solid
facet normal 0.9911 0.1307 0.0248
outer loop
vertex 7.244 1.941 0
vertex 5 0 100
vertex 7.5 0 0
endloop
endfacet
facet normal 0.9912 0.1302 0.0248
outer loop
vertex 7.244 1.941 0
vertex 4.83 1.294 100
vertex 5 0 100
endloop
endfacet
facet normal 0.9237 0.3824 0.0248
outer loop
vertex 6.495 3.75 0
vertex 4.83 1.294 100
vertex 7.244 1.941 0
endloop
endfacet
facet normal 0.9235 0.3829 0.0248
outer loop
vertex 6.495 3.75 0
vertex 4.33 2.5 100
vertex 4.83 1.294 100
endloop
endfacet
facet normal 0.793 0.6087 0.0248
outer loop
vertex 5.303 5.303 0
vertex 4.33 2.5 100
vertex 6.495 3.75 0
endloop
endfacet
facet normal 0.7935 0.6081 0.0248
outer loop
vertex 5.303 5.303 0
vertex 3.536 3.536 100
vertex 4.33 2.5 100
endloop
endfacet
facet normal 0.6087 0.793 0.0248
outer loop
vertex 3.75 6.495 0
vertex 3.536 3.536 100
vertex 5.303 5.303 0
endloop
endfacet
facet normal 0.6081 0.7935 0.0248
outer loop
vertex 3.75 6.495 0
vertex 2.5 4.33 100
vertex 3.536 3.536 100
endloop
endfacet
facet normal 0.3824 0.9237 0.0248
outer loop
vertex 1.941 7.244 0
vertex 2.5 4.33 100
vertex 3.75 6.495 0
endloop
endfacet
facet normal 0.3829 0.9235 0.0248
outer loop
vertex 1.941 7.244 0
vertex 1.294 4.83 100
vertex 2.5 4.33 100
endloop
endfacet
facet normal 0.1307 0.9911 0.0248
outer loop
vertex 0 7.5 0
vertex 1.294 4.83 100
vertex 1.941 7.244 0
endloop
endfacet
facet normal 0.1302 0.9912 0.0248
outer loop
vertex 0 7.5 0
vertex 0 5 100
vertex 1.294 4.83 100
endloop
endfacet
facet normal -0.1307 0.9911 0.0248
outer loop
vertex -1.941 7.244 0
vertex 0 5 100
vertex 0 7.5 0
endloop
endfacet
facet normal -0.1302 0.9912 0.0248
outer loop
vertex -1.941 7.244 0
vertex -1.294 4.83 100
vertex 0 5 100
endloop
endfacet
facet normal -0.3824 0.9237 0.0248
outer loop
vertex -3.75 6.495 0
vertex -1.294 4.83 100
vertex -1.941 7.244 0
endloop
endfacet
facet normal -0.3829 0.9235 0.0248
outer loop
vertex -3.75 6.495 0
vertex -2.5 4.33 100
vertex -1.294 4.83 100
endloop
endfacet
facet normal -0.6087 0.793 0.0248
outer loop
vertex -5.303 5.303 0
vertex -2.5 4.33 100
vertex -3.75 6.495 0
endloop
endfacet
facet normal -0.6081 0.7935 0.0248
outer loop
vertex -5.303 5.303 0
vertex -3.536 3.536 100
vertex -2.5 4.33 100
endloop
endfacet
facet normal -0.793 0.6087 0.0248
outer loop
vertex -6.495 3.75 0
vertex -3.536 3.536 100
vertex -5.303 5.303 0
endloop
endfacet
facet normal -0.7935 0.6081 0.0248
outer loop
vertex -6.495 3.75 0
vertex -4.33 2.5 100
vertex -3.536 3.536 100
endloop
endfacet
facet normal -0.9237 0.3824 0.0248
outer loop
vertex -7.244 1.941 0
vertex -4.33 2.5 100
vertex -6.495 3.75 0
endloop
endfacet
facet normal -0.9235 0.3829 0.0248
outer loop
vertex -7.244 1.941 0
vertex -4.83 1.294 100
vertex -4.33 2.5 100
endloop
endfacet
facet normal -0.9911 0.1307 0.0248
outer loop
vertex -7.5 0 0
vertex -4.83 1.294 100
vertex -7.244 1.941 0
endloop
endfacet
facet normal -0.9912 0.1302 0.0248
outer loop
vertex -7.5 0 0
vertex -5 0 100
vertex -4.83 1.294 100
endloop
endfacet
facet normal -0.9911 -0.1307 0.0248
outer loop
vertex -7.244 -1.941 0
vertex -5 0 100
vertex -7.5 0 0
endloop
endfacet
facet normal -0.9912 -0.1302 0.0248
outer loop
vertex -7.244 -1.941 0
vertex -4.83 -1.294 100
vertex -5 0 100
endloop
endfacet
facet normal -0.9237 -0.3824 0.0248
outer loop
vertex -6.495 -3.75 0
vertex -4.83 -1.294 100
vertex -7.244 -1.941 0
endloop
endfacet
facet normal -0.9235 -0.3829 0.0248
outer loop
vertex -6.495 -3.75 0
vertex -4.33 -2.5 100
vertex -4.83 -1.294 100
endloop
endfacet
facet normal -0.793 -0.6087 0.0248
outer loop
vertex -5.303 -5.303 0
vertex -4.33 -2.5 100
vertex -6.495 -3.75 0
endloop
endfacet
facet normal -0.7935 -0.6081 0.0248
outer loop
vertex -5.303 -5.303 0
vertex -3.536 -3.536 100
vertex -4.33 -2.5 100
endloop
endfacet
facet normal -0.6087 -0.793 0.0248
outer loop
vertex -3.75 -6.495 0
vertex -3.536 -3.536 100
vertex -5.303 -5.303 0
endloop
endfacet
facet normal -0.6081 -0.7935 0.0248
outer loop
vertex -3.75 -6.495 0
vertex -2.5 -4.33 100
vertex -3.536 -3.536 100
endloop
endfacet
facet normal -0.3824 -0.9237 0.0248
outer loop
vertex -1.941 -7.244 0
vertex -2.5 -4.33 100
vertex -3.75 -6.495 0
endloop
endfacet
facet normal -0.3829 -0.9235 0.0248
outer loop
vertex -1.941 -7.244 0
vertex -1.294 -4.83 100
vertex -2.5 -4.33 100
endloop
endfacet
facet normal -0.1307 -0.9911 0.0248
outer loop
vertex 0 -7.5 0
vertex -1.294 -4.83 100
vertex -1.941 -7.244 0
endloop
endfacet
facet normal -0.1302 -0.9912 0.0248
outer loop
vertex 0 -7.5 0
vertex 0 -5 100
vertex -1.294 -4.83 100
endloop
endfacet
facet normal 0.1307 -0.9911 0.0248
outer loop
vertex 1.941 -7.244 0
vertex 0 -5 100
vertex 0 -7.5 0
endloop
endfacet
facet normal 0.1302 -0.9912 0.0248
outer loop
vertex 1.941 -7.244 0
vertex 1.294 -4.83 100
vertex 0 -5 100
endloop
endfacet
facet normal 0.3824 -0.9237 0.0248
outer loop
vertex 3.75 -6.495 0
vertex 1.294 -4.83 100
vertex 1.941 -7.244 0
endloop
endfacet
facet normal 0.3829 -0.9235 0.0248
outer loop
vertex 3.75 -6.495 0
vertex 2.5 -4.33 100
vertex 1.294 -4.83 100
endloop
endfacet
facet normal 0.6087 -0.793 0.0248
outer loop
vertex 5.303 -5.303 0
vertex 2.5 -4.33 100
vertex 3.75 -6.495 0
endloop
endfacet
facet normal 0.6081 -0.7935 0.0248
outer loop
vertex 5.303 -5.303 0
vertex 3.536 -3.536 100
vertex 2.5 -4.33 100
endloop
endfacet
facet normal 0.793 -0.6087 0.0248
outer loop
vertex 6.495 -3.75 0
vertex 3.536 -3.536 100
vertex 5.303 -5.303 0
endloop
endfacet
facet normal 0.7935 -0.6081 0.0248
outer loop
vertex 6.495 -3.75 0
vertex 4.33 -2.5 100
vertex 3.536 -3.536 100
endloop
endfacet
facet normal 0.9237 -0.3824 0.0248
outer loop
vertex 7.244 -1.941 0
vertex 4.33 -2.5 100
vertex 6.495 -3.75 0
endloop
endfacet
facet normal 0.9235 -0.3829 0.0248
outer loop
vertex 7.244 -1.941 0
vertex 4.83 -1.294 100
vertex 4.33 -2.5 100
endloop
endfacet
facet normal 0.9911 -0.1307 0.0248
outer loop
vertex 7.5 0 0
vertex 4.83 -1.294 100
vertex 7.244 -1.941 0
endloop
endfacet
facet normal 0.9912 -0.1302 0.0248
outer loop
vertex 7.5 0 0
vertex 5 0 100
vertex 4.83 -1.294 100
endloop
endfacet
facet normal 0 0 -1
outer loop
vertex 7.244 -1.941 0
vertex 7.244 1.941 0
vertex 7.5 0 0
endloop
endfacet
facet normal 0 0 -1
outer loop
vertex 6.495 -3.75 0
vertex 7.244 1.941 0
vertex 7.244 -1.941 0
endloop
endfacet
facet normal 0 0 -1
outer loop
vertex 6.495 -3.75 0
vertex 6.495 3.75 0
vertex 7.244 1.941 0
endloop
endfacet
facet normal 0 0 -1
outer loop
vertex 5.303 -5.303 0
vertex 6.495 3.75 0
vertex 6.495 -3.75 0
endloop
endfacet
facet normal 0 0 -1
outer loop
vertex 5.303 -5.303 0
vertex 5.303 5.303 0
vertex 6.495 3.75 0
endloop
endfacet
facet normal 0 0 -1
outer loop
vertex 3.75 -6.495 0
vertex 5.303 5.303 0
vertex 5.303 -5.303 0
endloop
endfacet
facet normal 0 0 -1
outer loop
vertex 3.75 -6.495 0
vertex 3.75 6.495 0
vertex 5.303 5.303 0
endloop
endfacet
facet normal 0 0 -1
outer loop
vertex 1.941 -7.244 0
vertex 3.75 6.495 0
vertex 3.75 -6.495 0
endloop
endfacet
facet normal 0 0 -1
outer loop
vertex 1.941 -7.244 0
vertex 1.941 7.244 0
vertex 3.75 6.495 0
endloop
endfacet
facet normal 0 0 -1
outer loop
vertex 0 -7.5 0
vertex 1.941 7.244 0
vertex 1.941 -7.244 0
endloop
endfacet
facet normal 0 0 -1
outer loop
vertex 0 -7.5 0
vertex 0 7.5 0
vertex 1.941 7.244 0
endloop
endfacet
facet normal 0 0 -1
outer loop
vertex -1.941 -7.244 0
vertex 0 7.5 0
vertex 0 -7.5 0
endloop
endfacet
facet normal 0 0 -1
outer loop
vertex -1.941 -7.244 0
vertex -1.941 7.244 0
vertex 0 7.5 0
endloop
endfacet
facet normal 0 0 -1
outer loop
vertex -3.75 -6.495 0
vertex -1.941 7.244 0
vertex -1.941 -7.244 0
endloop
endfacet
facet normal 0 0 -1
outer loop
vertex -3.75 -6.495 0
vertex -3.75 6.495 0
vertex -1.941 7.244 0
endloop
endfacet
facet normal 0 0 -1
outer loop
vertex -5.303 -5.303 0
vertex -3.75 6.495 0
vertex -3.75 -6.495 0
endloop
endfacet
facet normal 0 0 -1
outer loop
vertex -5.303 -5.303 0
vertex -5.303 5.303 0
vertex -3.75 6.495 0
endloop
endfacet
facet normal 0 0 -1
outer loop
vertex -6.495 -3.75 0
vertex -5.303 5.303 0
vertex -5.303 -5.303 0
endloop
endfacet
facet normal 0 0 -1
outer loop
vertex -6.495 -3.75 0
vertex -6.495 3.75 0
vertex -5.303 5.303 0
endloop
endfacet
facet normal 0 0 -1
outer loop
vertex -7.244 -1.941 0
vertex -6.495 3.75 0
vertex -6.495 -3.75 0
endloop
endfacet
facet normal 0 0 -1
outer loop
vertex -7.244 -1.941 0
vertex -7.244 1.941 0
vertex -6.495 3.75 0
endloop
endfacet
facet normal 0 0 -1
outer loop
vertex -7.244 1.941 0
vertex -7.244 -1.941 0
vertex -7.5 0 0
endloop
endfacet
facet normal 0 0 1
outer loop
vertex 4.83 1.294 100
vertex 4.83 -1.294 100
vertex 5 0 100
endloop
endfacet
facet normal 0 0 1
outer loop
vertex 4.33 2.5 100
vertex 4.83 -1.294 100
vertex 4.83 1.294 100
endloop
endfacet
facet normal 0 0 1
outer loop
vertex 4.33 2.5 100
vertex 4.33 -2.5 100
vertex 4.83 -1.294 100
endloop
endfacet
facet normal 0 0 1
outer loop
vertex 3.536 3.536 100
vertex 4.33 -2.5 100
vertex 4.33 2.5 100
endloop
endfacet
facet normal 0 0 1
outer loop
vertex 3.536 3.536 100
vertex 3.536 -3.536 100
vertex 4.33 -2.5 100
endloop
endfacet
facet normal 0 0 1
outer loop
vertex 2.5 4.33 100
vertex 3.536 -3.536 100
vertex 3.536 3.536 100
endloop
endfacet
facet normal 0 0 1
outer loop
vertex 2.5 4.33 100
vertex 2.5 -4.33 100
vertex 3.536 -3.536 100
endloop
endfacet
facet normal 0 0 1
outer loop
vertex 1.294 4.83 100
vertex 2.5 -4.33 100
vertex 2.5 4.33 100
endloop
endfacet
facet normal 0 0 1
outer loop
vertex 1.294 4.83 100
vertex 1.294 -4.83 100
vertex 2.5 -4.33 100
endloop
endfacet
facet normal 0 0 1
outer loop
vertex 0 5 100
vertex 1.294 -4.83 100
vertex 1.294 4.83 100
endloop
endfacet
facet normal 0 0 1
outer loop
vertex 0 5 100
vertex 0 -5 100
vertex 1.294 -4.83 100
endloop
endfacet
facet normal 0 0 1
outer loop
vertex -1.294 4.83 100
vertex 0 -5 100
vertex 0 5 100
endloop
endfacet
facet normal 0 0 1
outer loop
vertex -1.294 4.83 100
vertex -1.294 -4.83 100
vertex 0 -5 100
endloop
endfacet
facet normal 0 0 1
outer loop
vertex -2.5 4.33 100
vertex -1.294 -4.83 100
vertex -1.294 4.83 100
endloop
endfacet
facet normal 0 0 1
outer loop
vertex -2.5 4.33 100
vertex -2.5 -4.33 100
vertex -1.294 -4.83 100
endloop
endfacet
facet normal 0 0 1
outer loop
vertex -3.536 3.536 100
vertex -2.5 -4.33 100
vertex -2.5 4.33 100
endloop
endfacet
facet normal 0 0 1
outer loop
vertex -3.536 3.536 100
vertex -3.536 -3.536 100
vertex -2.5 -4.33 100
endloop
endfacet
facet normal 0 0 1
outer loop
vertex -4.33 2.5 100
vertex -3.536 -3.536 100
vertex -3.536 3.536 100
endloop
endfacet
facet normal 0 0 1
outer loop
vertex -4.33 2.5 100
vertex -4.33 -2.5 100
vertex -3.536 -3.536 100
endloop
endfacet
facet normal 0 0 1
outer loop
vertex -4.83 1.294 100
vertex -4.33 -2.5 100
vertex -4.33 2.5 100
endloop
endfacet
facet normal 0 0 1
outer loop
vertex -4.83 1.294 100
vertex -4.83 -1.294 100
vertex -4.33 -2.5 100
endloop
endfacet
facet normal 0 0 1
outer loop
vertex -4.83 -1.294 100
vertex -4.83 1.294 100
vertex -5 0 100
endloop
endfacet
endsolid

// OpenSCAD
// Unit of length: Unit.MM
cylinder(h = 100.0, d1 = 15.0, d2 = 10.0, center = false, $fa = 12.0, $fs = 2.0, $fn = 0);
